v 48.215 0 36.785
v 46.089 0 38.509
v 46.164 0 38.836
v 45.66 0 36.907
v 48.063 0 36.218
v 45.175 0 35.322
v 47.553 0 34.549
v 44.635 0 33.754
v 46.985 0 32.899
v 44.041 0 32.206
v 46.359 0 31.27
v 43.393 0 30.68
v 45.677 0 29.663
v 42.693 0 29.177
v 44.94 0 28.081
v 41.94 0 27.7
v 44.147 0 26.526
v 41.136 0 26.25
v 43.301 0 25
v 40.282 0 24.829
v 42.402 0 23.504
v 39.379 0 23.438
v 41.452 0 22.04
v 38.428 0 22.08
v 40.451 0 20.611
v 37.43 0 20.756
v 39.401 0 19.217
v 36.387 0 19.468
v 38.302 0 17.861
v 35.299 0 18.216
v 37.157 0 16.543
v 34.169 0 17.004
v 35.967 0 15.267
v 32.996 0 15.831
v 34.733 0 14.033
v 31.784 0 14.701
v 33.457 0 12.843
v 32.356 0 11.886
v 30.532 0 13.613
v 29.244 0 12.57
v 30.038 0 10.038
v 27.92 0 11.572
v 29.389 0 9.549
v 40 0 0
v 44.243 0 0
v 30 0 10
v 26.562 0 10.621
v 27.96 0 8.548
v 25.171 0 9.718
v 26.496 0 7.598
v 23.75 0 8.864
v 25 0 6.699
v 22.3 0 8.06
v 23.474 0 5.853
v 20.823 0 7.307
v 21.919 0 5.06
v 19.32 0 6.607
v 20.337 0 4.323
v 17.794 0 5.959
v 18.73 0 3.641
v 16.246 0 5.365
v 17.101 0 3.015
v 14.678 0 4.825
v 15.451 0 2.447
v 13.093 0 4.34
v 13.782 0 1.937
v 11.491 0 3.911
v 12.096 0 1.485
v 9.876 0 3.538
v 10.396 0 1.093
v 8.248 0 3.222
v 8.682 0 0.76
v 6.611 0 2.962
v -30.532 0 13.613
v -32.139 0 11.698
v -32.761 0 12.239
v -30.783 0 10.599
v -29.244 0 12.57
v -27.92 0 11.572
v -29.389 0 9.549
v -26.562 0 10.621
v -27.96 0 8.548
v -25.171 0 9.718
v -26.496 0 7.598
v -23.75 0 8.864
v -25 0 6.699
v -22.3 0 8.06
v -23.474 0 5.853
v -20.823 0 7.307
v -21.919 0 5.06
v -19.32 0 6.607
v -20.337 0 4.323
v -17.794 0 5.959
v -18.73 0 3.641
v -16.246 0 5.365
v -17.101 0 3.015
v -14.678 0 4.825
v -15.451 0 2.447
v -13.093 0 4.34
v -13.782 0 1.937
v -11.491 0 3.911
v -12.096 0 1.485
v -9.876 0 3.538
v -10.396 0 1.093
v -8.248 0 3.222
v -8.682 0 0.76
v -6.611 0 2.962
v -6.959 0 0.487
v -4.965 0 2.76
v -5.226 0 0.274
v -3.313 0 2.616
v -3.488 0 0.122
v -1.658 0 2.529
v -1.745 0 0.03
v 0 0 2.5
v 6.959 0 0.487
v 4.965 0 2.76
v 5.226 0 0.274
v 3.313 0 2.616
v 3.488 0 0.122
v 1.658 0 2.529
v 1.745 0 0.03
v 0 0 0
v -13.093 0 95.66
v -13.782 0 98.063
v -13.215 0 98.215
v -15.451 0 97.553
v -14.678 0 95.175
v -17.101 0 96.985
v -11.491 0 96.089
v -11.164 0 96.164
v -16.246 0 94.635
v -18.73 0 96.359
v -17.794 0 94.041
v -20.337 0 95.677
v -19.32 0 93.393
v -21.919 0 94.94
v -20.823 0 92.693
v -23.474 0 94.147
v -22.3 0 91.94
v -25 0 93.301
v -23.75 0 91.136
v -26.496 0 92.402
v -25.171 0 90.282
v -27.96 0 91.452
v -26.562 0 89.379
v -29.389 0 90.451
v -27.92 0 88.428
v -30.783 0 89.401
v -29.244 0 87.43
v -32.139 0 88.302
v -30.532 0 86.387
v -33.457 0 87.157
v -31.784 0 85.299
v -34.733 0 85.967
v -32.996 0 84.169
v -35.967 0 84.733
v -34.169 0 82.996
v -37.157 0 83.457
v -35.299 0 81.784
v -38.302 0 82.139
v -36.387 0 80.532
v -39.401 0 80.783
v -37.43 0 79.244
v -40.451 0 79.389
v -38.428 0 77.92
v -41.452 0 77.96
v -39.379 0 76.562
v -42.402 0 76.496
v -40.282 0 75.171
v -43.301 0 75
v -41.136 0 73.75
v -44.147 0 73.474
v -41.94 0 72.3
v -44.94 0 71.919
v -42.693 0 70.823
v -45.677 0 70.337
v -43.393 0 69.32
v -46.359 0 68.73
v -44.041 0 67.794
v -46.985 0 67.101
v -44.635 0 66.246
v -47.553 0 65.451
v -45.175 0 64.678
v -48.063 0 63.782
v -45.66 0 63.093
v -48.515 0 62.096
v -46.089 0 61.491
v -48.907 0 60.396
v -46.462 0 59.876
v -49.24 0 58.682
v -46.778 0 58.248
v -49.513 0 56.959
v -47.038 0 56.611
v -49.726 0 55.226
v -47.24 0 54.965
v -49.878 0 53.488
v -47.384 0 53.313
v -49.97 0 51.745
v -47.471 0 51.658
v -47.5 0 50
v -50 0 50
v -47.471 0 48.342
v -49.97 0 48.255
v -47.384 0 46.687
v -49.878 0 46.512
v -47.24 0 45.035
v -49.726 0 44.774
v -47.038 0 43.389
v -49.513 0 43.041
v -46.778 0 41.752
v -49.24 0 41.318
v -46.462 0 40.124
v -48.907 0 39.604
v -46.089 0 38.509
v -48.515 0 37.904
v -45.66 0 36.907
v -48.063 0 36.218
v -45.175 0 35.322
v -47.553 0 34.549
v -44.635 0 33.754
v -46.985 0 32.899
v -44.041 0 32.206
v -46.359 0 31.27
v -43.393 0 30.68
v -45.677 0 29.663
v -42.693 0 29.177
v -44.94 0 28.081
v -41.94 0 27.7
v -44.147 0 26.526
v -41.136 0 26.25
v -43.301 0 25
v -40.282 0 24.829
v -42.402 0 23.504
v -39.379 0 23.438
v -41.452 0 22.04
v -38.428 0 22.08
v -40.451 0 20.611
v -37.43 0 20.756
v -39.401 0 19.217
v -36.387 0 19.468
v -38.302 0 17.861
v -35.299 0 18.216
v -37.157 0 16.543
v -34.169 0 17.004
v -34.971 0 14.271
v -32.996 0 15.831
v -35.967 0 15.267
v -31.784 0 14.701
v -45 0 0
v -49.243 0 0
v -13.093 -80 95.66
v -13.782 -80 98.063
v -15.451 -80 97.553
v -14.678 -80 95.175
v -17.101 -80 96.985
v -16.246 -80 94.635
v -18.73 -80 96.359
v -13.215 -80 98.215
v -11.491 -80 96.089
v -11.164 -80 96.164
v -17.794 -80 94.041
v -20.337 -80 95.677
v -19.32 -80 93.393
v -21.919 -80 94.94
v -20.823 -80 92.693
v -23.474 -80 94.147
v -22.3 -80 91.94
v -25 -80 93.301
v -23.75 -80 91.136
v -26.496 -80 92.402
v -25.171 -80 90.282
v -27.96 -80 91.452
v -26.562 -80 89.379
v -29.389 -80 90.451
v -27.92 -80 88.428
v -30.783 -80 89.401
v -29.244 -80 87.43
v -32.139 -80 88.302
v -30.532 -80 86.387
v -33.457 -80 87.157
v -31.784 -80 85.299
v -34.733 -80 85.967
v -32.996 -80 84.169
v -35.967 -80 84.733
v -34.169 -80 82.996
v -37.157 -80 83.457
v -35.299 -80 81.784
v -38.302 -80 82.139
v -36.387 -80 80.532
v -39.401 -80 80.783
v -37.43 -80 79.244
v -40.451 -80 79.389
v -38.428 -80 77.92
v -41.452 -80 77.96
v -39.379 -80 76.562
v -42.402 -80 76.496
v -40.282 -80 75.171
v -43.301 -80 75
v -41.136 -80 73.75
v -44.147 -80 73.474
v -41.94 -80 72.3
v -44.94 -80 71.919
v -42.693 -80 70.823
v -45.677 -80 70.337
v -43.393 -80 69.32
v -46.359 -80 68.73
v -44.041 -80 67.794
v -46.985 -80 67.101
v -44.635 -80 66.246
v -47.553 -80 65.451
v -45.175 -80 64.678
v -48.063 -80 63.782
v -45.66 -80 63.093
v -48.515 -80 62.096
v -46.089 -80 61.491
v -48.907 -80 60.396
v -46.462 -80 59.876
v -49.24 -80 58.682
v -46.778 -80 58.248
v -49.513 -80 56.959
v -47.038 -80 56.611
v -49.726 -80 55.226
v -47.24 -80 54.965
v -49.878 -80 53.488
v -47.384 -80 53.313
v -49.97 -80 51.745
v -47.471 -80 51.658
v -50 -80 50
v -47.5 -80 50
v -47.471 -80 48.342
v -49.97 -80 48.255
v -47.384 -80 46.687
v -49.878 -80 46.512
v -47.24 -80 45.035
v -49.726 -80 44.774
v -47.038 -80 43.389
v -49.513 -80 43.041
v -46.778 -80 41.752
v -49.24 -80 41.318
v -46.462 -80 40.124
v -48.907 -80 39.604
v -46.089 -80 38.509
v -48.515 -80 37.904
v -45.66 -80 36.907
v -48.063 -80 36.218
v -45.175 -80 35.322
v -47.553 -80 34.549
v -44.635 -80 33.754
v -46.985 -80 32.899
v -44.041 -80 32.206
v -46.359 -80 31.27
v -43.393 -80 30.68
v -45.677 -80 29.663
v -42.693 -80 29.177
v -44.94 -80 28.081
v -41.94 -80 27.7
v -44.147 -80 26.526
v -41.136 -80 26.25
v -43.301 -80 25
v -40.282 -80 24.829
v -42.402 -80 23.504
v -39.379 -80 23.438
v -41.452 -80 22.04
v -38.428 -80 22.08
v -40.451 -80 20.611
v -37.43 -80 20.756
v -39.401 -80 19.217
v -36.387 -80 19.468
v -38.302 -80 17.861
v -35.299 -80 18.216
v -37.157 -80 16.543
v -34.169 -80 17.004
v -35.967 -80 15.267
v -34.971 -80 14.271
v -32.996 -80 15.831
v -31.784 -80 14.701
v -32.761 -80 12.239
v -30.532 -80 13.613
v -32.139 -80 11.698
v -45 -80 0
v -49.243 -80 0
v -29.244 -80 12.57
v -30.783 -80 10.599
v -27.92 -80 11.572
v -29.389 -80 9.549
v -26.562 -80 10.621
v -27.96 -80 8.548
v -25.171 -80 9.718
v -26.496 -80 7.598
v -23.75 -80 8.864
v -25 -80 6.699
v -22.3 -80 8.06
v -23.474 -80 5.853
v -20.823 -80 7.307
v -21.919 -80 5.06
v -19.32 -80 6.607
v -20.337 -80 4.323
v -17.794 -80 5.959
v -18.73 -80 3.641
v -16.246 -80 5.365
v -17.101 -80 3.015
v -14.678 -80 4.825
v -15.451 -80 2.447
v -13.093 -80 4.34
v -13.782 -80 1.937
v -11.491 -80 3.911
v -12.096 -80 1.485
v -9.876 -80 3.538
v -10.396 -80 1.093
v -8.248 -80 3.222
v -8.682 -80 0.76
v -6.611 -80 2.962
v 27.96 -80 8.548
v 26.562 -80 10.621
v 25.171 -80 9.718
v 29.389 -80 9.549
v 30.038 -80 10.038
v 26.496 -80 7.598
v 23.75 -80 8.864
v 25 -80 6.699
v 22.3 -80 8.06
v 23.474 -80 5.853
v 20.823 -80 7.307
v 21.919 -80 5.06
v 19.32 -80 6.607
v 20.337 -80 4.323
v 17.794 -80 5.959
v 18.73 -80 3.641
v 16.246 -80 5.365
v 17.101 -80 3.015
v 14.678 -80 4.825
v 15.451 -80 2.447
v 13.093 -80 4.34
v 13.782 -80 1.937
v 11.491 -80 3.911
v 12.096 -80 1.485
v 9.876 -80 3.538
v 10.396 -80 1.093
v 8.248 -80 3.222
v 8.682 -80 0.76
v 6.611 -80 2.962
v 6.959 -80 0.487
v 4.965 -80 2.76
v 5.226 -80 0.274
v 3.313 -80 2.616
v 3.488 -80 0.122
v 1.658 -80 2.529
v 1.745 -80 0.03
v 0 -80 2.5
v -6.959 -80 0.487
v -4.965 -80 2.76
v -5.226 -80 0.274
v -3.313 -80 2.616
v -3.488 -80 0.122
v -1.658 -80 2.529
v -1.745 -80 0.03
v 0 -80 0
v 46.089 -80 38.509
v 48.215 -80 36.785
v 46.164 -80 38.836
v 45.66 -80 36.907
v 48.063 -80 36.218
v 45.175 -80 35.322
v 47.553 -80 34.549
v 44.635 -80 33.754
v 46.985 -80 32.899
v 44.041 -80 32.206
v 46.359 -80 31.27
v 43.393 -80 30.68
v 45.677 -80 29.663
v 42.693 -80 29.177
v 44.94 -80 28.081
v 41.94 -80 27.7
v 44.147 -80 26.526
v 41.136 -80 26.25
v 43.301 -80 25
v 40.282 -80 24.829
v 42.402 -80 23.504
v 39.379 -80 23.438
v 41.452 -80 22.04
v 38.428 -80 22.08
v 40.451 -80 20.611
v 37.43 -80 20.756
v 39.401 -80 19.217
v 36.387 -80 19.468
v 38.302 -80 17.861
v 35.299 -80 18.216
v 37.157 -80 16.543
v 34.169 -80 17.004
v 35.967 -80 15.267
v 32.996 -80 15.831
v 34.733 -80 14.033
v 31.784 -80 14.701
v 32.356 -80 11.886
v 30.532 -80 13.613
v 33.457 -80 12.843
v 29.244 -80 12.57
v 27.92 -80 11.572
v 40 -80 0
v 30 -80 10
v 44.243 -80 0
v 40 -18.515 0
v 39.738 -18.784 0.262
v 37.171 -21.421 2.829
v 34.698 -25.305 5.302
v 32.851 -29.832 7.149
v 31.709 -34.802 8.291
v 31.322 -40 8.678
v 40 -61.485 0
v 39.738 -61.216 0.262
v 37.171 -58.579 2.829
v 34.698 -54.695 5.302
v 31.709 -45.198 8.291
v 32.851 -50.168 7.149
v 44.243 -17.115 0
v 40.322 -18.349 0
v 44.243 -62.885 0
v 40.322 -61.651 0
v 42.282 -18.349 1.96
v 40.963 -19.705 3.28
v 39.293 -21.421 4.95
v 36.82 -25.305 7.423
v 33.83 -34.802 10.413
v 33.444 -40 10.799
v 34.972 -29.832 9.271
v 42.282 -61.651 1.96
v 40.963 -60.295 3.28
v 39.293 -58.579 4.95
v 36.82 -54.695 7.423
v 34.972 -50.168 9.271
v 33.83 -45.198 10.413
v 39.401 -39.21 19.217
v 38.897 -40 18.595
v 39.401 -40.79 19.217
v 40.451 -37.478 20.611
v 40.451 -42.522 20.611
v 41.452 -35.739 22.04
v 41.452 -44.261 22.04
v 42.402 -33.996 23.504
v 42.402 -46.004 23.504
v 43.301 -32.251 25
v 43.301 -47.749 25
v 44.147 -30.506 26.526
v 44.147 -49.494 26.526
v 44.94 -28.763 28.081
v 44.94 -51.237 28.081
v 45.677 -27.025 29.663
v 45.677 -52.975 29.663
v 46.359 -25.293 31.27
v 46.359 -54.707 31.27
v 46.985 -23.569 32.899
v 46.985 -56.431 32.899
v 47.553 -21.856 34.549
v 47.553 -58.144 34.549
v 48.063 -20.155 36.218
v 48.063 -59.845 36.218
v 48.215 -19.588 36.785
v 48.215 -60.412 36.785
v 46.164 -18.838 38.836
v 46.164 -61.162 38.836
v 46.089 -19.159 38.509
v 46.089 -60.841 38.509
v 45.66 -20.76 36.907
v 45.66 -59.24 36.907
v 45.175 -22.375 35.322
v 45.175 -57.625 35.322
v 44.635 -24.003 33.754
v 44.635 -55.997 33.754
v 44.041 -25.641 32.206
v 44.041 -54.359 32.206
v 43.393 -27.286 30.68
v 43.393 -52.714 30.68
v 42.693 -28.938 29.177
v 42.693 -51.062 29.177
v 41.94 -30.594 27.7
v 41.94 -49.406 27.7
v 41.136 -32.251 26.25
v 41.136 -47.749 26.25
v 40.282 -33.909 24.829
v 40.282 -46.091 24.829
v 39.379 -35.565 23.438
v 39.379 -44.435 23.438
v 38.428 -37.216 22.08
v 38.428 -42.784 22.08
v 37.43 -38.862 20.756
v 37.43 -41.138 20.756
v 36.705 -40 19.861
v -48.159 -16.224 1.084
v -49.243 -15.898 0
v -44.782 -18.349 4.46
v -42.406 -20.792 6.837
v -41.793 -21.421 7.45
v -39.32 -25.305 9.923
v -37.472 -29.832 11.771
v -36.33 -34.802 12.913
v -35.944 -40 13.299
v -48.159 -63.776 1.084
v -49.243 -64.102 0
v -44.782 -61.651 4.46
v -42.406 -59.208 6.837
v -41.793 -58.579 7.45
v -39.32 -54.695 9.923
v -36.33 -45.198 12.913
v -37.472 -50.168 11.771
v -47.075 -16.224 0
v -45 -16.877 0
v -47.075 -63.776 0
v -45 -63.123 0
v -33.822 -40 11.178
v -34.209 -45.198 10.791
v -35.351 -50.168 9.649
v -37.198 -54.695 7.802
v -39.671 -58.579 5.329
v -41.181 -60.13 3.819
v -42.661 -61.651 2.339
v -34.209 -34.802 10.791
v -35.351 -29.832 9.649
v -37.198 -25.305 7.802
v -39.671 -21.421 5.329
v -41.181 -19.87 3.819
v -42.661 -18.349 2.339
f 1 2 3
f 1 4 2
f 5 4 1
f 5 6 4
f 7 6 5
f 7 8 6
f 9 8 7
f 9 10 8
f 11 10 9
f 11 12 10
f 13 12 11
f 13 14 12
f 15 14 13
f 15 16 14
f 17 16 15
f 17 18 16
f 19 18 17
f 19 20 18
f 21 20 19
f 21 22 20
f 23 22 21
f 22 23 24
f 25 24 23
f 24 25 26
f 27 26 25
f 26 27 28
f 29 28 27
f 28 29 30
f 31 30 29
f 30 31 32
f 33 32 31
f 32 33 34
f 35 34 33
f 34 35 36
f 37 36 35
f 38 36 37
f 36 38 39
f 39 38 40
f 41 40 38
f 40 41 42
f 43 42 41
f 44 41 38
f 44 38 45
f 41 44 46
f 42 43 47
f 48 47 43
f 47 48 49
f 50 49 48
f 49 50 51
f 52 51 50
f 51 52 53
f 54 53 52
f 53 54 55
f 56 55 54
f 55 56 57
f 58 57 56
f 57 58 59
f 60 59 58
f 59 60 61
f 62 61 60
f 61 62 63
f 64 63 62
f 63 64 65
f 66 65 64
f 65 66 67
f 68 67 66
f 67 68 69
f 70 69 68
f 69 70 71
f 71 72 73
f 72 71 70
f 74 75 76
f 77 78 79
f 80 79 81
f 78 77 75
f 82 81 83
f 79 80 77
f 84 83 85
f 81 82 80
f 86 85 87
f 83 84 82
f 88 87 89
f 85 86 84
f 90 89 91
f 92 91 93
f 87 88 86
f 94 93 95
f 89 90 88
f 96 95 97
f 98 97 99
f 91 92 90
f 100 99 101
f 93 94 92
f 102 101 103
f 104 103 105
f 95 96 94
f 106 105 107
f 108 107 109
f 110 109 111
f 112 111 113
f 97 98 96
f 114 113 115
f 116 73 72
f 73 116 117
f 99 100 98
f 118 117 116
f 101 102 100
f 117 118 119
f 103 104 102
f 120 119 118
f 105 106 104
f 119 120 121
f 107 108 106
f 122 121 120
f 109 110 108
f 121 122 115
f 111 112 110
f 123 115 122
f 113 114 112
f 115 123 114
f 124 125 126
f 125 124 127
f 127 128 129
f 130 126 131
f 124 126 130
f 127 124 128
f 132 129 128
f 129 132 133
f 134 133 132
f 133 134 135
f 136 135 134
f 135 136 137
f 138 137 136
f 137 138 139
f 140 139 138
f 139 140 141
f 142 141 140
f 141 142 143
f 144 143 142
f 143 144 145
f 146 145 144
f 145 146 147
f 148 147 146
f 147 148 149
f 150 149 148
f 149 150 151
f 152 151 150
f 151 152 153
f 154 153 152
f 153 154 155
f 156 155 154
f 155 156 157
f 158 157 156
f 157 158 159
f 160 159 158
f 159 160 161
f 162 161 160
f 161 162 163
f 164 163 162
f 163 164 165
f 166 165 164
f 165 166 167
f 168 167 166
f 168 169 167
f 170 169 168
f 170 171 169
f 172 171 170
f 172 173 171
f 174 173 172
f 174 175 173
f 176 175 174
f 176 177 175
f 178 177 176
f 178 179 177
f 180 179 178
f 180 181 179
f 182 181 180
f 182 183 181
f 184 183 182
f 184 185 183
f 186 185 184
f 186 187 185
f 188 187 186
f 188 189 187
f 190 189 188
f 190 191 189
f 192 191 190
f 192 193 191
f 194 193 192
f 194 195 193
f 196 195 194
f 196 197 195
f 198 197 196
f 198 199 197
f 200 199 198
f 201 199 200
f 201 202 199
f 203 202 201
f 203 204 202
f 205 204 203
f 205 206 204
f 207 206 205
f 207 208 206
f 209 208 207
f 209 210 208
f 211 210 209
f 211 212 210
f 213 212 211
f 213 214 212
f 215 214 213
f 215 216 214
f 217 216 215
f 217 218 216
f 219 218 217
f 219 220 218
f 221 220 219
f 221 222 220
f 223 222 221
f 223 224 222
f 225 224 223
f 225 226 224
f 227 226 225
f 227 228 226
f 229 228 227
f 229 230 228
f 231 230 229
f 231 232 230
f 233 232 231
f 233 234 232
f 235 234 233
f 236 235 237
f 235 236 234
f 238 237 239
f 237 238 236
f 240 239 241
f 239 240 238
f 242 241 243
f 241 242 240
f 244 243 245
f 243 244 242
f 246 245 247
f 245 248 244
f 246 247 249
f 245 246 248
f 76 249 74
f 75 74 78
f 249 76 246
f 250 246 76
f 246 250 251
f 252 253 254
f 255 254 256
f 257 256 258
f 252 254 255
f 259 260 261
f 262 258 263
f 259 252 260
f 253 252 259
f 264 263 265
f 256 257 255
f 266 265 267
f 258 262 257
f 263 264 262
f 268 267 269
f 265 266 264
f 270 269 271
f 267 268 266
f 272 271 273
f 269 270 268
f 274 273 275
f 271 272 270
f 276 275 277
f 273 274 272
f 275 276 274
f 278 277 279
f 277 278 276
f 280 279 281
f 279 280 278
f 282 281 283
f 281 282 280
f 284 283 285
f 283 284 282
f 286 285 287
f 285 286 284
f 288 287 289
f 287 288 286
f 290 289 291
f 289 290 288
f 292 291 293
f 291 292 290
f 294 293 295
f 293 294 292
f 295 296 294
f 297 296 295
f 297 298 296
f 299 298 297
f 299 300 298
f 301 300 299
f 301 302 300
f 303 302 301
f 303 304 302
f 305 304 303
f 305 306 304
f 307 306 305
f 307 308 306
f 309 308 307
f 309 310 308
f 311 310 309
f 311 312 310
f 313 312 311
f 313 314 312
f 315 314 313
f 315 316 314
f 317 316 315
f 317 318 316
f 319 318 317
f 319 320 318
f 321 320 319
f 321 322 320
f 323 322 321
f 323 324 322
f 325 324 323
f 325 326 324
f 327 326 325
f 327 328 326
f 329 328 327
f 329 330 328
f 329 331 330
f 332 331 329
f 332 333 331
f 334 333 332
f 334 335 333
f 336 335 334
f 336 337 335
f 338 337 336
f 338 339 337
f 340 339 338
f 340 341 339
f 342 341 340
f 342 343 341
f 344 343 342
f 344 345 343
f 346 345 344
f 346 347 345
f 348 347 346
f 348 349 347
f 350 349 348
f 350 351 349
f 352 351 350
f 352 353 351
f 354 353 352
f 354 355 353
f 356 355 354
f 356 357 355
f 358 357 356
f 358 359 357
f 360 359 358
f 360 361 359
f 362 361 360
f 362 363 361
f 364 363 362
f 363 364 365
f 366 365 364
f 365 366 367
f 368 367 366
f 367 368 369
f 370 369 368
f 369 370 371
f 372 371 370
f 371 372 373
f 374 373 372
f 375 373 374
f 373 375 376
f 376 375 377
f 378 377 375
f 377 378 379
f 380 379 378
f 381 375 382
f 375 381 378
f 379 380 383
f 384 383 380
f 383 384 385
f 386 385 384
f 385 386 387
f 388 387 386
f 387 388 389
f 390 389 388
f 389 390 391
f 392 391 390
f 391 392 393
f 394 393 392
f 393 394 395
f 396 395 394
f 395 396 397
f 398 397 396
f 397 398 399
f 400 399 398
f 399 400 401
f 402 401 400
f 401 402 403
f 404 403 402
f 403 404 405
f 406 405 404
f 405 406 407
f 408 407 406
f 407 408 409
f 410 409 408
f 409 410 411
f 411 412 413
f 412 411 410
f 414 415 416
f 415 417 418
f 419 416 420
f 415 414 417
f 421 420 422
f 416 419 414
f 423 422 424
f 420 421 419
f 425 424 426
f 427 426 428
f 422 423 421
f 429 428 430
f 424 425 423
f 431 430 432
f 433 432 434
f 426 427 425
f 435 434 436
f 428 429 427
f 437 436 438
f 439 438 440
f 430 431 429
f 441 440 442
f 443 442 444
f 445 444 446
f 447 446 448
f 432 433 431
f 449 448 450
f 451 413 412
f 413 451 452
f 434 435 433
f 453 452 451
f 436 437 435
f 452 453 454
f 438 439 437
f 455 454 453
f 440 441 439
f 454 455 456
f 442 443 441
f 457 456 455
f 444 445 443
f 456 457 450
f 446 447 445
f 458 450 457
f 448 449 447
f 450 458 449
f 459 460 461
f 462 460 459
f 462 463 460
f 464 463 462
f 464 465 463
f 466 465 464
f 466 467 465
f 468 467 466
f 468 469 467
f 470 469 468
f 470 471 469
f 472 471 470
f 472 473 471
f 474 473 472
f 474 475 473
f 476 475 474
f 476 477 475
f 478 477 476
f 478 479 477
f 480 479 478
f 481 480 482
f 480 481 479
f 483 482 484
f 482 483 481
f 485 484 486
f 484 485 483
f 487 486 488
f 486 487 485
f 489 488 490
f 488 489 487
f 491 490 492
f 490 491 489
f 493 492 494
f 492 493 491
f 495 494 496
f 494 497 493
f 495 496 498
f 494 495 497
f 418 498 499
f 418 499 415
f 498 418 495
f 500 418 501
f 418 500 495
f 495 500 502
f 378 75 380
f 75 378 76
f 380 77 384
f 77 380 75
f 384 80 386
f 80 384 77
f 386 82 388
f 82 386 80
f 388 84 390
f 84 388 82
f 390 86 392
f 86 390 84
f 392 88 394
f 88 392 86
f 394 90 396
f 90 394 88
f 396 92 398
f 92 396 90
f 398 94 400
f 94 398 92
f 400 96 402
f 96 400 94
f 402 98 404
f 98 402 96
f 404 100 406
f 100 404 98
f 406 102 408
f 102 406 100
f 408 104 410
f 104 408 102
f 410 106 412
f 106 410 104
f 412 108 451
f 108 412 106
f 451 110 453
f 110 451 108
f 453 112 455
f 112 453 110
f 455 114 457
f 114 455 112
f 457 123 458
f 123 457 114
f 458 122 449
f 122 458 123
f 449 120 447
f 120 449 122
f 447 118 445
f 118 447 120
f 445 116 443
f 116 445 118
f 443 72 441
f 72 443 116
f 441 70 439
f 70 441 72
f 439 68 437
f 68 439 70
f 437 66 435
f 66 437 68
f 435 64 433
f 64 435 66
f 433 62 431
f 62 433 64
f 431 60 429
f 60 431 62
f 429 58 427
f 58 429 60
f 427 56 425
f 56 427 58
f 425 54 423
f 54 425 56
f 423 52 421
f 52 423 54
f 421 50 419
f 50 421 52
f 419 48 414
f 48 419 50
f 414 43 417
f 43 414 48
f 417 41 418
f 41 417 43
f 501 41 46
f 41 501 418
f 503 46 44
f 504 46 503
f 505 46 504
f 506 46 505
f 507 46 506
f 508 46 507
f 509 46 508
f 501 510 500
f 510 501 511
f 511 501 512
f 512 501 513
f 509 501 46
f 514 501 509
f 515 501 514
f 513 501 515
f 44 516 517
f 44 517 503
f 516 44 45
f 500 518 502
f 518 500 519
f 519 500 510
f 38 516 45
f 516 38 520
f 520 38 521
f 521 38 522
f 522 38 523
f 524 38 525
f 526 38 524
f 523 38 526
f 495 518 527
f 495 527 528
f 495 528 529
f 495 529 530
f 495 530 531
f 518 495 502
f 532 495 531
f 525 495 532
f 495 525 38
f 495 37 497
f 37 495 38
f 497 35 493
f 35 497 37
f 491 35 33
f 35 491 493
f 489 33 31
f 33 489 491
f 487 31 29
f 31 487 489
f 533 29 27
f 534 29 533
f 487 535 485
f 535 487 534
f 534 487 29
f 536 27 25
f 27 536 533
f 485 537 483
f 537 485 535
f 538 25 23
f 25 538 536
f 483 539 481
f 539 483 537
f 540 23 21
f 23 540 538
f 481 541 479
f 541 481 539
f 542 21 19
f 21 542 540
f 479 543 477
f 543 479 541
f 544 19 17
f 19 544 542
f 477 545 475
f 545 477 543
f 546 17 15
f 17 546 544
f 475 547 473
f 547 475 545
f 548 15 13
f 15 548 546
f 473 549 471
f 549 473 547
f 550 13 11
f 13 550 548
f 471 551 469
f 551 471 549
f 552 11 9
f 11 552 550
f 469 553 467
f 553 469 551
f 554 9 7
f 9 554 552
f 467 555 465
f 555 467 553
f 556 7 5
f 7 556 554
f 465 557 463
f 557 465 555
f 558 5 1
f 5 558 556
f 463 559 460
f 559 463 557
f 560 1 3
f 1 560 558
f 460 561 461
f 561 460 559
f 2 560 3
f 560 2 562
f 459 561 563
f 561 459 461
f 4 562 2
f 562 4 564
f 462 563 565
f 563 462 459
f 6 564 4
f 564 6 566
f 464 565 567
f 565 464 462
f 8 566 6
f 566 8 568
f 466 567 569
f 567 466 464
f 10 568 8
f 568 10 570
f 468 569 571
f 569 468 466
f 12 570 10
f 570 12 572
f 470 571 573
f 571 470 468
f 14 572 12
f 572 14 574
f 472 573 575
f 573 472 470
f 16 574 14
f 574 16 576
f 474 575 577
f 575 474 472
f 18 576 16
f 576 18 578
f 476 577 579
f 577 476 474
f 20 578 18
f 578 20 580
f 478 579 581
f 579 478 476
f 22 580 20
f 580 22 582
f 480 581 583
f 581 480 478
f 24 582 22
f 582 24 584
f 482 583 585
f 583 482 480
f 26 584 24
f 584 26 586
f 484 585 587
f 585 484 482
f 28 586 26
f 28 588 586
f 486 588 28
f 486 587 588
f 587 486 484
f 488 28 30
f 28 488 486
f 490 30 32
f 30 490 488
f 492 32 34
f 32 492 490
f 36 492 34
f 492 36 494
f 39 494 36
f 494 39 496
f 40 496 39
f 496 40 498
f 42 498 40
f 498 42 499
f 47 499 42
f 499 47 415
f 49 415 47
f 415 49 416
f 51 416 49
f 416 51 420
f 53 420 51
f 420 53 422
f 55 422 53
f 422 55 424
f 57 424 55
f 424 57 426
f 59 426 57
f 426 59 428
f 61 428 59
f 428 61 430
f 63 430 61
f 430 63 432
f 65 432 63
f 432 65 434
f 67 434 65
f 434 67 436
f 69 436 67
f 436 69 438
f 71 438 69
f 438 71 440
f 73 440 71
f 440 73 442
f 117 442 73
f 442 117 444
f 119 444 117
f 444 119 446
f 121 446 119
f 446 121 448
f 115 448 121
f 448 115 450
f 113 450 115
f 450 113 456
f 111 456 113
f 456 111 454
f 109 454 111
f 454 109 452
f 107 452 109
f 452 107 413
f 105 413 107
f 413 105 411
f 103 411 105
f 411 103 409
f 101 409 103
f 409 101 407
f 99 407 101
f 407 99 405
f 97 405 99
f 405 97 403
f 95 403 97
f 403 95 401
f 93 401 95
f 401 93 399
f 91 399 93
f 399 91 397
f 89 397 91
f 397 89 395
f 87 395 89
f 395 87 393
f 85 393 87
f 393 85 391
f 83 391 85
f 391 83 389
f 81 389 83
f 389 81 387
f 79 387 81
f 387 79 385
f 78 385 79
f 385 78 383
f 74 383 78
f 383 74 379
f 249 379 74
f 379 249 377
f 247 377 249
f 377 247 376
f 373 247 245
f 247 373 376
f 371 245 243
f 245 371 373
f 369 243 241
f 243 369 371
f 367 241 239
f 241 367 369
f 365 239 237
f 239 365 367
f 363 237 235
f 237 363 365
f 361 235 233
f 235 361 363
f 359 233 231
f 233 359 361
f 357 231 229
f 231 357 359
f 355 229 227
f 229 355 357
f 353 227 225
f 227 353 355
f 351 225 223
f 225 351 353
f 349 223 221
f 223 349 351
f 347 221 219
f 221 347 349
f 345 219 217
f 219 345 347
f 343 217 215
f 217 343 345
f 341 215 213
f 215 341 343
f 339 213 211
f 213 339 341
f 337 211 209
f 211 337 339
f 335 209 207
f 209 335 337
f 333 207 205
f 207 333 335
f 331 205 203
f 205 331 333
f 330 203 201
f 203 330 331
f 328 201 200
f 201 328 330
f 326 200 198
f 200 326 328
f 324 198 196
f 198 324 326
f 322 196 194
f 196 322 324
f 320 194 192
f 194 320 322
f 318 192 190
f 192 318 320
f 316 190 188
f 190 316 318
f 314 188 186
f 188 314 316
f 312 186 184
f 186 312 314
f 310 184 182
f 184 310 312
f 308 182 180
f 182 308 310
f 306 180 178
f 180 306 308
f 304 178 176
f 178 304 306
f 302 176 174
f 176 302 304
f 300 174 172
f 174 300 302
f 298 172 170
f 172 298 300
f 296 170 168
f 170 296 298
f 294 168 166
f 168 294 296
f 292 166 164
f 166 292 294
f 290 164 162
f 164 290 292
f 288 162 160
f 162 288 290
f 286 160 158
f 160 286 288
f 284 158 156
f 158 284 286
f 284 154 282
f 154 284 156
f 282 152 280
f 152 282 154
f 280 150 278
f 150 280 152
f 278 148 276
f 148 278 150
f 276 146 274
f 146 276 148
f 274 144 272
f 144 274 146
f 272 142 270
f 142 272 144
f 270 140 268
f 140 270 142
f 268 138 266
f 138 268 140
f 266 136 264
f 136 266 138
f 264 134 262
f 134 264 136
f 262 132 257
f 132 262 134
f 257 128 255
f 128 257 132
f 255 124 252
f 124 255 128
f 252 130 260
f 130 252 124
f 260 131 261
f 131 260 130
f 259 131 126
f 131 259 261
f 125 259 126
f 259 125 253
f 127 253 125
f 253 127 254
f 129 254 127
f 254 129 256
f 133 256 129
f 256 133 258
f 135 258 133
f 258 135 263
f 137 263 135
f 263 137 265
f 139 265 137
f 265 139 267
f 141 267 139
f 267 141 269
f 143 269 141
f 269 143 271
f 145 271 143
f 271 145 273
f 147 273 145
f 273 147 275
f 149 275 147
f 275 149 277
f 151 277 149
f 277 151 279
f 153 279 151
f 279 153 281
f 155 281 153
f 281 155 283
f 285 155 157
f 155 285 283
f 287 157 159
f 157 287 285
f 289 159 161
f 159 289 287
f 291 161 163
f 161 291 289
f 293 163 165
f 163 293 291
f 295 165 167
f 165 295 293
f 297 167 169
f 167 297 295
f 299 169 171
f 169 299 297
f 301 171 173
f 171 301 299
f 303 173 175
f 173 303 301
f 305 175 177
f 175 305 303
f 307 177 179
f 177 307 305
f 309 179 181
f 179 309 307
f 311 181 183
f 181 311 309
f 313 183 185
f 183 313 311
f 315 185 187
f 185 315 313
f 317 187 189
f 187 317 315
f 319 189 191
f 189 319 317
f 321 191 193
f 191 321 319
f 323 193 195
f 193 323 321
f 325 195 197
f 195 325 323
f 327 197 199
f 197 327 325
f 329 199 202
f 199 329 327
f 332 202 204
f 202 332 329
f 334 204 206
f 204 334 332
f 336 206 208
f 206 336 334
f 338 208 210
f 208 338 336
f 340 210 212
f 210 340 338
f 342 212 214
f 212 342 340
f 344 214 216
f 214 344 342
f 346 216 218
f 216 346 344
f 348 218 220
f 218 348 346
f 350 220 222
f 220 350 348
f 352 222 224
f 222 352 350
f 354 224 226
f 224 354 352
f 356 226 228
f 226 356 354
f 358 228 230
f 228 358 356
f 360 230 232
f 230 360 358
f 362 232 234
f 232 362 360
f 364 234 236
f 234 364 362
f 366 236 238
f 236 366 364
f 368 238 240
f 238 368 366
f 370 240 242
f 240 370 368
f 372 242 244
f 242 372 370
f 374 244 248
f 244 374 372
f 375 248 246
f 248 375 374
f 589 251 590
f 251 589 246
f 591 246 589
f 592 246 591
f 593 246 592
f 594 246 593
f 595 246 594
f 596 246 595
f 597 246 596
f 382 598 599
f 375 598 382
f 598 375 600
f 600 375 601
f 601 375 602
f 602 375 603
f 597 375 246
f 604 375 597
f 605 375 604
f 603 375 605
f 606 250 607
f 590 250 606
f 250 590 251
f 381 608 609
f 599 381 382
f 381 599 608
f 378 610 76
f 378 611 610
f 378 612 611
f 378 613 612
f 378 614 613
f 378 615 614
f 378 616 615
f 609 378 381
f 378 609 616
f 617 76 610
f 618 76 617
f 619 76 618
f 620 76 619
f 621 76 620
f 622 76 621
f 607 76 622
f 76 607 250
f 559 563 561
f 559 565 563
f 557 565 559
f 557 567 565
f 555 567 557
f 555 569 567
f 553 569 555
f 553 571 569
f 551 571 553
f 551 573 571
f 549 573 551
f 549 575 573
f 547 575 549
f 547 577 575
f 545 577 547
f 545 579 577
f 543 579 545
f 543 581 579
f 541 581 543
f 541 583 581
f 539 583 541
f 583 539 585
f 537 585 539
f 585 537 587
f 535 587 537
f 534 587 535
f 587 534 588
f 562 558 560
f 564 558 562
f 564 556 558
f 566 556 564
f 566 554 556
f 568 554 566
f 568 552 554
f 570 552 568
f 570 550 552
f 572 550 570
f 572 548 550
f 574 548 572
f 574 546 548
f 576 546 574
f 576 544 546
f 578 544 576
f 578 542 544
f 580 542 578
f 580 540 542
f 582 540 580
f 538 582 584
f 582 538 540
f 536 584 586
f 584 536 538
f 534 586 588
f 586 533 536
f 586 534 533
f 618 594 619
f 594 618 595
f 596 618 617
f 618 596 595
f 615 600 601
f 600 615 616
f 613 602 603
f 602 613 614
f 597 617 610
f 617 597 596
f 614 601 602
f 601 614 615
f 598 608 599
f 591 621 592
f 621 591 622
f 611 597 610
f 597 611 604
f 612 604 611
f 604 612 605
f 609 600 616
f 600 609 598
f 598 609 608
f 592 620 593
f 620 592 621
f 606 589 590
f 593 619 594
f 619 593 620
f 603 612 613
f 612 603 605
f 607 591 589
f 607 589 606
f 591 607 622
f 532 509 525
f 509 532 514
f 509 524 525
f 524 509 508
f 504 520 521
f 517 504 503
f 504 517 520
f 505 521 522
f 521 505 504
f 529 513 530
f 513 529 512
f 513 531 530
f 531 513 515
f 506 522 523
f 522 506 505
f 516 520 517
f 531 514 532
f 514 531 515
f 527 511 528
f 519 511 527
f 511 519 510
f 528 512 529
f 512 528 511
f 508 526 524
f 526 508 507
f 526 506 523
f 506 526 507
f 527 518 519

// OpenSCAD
diameter=100;

module bottom(){
    translate([-60,-20,0]) square([200,20]);
}

module triangle() {
   polygon([[30,0],[0,30],[60,30]]);  
}

module base() {
    union() {
    translate([0, diameter/2, 0])
    difference() {
      circle(d=diameter, $fn=180);
      circle(d=diameter-5, $fn=180);
      translate([-diameter/20,-diameter/20,0]) square(diameter*2);
      translate([-15,50,0])
        rotate([0,0,-45]) 
          #square([diameter,10]);
    }
    
    difference() {
    translate([-50,-5,0]) 
      rotate([0,0,45])
        square([25, 3]);
    bottom();
    }
    difference() {
    translate([30,10,0])
      rotate([0,0,-45])
        square([30, 3]);
     bottom();
    }
    }
}

difference() {
rotate([90,0,0])
 linear_extrude(height=80, slices=180)
   base();

translate([33, -70, 22])
 rotate([120,0,90])
  linear_extrude(height=10)
    triangle();
    
// nice circle cut on leg
translate([-48,-40,-10])
  rotate([0,-45])
    linear_extrude(height=10)
     circle(diameter/4);
// Front leg
translate([48,-40,-10])
  rotate([0,45])
    linear_extrude(height=10)
     circle(diameter/4);

}
